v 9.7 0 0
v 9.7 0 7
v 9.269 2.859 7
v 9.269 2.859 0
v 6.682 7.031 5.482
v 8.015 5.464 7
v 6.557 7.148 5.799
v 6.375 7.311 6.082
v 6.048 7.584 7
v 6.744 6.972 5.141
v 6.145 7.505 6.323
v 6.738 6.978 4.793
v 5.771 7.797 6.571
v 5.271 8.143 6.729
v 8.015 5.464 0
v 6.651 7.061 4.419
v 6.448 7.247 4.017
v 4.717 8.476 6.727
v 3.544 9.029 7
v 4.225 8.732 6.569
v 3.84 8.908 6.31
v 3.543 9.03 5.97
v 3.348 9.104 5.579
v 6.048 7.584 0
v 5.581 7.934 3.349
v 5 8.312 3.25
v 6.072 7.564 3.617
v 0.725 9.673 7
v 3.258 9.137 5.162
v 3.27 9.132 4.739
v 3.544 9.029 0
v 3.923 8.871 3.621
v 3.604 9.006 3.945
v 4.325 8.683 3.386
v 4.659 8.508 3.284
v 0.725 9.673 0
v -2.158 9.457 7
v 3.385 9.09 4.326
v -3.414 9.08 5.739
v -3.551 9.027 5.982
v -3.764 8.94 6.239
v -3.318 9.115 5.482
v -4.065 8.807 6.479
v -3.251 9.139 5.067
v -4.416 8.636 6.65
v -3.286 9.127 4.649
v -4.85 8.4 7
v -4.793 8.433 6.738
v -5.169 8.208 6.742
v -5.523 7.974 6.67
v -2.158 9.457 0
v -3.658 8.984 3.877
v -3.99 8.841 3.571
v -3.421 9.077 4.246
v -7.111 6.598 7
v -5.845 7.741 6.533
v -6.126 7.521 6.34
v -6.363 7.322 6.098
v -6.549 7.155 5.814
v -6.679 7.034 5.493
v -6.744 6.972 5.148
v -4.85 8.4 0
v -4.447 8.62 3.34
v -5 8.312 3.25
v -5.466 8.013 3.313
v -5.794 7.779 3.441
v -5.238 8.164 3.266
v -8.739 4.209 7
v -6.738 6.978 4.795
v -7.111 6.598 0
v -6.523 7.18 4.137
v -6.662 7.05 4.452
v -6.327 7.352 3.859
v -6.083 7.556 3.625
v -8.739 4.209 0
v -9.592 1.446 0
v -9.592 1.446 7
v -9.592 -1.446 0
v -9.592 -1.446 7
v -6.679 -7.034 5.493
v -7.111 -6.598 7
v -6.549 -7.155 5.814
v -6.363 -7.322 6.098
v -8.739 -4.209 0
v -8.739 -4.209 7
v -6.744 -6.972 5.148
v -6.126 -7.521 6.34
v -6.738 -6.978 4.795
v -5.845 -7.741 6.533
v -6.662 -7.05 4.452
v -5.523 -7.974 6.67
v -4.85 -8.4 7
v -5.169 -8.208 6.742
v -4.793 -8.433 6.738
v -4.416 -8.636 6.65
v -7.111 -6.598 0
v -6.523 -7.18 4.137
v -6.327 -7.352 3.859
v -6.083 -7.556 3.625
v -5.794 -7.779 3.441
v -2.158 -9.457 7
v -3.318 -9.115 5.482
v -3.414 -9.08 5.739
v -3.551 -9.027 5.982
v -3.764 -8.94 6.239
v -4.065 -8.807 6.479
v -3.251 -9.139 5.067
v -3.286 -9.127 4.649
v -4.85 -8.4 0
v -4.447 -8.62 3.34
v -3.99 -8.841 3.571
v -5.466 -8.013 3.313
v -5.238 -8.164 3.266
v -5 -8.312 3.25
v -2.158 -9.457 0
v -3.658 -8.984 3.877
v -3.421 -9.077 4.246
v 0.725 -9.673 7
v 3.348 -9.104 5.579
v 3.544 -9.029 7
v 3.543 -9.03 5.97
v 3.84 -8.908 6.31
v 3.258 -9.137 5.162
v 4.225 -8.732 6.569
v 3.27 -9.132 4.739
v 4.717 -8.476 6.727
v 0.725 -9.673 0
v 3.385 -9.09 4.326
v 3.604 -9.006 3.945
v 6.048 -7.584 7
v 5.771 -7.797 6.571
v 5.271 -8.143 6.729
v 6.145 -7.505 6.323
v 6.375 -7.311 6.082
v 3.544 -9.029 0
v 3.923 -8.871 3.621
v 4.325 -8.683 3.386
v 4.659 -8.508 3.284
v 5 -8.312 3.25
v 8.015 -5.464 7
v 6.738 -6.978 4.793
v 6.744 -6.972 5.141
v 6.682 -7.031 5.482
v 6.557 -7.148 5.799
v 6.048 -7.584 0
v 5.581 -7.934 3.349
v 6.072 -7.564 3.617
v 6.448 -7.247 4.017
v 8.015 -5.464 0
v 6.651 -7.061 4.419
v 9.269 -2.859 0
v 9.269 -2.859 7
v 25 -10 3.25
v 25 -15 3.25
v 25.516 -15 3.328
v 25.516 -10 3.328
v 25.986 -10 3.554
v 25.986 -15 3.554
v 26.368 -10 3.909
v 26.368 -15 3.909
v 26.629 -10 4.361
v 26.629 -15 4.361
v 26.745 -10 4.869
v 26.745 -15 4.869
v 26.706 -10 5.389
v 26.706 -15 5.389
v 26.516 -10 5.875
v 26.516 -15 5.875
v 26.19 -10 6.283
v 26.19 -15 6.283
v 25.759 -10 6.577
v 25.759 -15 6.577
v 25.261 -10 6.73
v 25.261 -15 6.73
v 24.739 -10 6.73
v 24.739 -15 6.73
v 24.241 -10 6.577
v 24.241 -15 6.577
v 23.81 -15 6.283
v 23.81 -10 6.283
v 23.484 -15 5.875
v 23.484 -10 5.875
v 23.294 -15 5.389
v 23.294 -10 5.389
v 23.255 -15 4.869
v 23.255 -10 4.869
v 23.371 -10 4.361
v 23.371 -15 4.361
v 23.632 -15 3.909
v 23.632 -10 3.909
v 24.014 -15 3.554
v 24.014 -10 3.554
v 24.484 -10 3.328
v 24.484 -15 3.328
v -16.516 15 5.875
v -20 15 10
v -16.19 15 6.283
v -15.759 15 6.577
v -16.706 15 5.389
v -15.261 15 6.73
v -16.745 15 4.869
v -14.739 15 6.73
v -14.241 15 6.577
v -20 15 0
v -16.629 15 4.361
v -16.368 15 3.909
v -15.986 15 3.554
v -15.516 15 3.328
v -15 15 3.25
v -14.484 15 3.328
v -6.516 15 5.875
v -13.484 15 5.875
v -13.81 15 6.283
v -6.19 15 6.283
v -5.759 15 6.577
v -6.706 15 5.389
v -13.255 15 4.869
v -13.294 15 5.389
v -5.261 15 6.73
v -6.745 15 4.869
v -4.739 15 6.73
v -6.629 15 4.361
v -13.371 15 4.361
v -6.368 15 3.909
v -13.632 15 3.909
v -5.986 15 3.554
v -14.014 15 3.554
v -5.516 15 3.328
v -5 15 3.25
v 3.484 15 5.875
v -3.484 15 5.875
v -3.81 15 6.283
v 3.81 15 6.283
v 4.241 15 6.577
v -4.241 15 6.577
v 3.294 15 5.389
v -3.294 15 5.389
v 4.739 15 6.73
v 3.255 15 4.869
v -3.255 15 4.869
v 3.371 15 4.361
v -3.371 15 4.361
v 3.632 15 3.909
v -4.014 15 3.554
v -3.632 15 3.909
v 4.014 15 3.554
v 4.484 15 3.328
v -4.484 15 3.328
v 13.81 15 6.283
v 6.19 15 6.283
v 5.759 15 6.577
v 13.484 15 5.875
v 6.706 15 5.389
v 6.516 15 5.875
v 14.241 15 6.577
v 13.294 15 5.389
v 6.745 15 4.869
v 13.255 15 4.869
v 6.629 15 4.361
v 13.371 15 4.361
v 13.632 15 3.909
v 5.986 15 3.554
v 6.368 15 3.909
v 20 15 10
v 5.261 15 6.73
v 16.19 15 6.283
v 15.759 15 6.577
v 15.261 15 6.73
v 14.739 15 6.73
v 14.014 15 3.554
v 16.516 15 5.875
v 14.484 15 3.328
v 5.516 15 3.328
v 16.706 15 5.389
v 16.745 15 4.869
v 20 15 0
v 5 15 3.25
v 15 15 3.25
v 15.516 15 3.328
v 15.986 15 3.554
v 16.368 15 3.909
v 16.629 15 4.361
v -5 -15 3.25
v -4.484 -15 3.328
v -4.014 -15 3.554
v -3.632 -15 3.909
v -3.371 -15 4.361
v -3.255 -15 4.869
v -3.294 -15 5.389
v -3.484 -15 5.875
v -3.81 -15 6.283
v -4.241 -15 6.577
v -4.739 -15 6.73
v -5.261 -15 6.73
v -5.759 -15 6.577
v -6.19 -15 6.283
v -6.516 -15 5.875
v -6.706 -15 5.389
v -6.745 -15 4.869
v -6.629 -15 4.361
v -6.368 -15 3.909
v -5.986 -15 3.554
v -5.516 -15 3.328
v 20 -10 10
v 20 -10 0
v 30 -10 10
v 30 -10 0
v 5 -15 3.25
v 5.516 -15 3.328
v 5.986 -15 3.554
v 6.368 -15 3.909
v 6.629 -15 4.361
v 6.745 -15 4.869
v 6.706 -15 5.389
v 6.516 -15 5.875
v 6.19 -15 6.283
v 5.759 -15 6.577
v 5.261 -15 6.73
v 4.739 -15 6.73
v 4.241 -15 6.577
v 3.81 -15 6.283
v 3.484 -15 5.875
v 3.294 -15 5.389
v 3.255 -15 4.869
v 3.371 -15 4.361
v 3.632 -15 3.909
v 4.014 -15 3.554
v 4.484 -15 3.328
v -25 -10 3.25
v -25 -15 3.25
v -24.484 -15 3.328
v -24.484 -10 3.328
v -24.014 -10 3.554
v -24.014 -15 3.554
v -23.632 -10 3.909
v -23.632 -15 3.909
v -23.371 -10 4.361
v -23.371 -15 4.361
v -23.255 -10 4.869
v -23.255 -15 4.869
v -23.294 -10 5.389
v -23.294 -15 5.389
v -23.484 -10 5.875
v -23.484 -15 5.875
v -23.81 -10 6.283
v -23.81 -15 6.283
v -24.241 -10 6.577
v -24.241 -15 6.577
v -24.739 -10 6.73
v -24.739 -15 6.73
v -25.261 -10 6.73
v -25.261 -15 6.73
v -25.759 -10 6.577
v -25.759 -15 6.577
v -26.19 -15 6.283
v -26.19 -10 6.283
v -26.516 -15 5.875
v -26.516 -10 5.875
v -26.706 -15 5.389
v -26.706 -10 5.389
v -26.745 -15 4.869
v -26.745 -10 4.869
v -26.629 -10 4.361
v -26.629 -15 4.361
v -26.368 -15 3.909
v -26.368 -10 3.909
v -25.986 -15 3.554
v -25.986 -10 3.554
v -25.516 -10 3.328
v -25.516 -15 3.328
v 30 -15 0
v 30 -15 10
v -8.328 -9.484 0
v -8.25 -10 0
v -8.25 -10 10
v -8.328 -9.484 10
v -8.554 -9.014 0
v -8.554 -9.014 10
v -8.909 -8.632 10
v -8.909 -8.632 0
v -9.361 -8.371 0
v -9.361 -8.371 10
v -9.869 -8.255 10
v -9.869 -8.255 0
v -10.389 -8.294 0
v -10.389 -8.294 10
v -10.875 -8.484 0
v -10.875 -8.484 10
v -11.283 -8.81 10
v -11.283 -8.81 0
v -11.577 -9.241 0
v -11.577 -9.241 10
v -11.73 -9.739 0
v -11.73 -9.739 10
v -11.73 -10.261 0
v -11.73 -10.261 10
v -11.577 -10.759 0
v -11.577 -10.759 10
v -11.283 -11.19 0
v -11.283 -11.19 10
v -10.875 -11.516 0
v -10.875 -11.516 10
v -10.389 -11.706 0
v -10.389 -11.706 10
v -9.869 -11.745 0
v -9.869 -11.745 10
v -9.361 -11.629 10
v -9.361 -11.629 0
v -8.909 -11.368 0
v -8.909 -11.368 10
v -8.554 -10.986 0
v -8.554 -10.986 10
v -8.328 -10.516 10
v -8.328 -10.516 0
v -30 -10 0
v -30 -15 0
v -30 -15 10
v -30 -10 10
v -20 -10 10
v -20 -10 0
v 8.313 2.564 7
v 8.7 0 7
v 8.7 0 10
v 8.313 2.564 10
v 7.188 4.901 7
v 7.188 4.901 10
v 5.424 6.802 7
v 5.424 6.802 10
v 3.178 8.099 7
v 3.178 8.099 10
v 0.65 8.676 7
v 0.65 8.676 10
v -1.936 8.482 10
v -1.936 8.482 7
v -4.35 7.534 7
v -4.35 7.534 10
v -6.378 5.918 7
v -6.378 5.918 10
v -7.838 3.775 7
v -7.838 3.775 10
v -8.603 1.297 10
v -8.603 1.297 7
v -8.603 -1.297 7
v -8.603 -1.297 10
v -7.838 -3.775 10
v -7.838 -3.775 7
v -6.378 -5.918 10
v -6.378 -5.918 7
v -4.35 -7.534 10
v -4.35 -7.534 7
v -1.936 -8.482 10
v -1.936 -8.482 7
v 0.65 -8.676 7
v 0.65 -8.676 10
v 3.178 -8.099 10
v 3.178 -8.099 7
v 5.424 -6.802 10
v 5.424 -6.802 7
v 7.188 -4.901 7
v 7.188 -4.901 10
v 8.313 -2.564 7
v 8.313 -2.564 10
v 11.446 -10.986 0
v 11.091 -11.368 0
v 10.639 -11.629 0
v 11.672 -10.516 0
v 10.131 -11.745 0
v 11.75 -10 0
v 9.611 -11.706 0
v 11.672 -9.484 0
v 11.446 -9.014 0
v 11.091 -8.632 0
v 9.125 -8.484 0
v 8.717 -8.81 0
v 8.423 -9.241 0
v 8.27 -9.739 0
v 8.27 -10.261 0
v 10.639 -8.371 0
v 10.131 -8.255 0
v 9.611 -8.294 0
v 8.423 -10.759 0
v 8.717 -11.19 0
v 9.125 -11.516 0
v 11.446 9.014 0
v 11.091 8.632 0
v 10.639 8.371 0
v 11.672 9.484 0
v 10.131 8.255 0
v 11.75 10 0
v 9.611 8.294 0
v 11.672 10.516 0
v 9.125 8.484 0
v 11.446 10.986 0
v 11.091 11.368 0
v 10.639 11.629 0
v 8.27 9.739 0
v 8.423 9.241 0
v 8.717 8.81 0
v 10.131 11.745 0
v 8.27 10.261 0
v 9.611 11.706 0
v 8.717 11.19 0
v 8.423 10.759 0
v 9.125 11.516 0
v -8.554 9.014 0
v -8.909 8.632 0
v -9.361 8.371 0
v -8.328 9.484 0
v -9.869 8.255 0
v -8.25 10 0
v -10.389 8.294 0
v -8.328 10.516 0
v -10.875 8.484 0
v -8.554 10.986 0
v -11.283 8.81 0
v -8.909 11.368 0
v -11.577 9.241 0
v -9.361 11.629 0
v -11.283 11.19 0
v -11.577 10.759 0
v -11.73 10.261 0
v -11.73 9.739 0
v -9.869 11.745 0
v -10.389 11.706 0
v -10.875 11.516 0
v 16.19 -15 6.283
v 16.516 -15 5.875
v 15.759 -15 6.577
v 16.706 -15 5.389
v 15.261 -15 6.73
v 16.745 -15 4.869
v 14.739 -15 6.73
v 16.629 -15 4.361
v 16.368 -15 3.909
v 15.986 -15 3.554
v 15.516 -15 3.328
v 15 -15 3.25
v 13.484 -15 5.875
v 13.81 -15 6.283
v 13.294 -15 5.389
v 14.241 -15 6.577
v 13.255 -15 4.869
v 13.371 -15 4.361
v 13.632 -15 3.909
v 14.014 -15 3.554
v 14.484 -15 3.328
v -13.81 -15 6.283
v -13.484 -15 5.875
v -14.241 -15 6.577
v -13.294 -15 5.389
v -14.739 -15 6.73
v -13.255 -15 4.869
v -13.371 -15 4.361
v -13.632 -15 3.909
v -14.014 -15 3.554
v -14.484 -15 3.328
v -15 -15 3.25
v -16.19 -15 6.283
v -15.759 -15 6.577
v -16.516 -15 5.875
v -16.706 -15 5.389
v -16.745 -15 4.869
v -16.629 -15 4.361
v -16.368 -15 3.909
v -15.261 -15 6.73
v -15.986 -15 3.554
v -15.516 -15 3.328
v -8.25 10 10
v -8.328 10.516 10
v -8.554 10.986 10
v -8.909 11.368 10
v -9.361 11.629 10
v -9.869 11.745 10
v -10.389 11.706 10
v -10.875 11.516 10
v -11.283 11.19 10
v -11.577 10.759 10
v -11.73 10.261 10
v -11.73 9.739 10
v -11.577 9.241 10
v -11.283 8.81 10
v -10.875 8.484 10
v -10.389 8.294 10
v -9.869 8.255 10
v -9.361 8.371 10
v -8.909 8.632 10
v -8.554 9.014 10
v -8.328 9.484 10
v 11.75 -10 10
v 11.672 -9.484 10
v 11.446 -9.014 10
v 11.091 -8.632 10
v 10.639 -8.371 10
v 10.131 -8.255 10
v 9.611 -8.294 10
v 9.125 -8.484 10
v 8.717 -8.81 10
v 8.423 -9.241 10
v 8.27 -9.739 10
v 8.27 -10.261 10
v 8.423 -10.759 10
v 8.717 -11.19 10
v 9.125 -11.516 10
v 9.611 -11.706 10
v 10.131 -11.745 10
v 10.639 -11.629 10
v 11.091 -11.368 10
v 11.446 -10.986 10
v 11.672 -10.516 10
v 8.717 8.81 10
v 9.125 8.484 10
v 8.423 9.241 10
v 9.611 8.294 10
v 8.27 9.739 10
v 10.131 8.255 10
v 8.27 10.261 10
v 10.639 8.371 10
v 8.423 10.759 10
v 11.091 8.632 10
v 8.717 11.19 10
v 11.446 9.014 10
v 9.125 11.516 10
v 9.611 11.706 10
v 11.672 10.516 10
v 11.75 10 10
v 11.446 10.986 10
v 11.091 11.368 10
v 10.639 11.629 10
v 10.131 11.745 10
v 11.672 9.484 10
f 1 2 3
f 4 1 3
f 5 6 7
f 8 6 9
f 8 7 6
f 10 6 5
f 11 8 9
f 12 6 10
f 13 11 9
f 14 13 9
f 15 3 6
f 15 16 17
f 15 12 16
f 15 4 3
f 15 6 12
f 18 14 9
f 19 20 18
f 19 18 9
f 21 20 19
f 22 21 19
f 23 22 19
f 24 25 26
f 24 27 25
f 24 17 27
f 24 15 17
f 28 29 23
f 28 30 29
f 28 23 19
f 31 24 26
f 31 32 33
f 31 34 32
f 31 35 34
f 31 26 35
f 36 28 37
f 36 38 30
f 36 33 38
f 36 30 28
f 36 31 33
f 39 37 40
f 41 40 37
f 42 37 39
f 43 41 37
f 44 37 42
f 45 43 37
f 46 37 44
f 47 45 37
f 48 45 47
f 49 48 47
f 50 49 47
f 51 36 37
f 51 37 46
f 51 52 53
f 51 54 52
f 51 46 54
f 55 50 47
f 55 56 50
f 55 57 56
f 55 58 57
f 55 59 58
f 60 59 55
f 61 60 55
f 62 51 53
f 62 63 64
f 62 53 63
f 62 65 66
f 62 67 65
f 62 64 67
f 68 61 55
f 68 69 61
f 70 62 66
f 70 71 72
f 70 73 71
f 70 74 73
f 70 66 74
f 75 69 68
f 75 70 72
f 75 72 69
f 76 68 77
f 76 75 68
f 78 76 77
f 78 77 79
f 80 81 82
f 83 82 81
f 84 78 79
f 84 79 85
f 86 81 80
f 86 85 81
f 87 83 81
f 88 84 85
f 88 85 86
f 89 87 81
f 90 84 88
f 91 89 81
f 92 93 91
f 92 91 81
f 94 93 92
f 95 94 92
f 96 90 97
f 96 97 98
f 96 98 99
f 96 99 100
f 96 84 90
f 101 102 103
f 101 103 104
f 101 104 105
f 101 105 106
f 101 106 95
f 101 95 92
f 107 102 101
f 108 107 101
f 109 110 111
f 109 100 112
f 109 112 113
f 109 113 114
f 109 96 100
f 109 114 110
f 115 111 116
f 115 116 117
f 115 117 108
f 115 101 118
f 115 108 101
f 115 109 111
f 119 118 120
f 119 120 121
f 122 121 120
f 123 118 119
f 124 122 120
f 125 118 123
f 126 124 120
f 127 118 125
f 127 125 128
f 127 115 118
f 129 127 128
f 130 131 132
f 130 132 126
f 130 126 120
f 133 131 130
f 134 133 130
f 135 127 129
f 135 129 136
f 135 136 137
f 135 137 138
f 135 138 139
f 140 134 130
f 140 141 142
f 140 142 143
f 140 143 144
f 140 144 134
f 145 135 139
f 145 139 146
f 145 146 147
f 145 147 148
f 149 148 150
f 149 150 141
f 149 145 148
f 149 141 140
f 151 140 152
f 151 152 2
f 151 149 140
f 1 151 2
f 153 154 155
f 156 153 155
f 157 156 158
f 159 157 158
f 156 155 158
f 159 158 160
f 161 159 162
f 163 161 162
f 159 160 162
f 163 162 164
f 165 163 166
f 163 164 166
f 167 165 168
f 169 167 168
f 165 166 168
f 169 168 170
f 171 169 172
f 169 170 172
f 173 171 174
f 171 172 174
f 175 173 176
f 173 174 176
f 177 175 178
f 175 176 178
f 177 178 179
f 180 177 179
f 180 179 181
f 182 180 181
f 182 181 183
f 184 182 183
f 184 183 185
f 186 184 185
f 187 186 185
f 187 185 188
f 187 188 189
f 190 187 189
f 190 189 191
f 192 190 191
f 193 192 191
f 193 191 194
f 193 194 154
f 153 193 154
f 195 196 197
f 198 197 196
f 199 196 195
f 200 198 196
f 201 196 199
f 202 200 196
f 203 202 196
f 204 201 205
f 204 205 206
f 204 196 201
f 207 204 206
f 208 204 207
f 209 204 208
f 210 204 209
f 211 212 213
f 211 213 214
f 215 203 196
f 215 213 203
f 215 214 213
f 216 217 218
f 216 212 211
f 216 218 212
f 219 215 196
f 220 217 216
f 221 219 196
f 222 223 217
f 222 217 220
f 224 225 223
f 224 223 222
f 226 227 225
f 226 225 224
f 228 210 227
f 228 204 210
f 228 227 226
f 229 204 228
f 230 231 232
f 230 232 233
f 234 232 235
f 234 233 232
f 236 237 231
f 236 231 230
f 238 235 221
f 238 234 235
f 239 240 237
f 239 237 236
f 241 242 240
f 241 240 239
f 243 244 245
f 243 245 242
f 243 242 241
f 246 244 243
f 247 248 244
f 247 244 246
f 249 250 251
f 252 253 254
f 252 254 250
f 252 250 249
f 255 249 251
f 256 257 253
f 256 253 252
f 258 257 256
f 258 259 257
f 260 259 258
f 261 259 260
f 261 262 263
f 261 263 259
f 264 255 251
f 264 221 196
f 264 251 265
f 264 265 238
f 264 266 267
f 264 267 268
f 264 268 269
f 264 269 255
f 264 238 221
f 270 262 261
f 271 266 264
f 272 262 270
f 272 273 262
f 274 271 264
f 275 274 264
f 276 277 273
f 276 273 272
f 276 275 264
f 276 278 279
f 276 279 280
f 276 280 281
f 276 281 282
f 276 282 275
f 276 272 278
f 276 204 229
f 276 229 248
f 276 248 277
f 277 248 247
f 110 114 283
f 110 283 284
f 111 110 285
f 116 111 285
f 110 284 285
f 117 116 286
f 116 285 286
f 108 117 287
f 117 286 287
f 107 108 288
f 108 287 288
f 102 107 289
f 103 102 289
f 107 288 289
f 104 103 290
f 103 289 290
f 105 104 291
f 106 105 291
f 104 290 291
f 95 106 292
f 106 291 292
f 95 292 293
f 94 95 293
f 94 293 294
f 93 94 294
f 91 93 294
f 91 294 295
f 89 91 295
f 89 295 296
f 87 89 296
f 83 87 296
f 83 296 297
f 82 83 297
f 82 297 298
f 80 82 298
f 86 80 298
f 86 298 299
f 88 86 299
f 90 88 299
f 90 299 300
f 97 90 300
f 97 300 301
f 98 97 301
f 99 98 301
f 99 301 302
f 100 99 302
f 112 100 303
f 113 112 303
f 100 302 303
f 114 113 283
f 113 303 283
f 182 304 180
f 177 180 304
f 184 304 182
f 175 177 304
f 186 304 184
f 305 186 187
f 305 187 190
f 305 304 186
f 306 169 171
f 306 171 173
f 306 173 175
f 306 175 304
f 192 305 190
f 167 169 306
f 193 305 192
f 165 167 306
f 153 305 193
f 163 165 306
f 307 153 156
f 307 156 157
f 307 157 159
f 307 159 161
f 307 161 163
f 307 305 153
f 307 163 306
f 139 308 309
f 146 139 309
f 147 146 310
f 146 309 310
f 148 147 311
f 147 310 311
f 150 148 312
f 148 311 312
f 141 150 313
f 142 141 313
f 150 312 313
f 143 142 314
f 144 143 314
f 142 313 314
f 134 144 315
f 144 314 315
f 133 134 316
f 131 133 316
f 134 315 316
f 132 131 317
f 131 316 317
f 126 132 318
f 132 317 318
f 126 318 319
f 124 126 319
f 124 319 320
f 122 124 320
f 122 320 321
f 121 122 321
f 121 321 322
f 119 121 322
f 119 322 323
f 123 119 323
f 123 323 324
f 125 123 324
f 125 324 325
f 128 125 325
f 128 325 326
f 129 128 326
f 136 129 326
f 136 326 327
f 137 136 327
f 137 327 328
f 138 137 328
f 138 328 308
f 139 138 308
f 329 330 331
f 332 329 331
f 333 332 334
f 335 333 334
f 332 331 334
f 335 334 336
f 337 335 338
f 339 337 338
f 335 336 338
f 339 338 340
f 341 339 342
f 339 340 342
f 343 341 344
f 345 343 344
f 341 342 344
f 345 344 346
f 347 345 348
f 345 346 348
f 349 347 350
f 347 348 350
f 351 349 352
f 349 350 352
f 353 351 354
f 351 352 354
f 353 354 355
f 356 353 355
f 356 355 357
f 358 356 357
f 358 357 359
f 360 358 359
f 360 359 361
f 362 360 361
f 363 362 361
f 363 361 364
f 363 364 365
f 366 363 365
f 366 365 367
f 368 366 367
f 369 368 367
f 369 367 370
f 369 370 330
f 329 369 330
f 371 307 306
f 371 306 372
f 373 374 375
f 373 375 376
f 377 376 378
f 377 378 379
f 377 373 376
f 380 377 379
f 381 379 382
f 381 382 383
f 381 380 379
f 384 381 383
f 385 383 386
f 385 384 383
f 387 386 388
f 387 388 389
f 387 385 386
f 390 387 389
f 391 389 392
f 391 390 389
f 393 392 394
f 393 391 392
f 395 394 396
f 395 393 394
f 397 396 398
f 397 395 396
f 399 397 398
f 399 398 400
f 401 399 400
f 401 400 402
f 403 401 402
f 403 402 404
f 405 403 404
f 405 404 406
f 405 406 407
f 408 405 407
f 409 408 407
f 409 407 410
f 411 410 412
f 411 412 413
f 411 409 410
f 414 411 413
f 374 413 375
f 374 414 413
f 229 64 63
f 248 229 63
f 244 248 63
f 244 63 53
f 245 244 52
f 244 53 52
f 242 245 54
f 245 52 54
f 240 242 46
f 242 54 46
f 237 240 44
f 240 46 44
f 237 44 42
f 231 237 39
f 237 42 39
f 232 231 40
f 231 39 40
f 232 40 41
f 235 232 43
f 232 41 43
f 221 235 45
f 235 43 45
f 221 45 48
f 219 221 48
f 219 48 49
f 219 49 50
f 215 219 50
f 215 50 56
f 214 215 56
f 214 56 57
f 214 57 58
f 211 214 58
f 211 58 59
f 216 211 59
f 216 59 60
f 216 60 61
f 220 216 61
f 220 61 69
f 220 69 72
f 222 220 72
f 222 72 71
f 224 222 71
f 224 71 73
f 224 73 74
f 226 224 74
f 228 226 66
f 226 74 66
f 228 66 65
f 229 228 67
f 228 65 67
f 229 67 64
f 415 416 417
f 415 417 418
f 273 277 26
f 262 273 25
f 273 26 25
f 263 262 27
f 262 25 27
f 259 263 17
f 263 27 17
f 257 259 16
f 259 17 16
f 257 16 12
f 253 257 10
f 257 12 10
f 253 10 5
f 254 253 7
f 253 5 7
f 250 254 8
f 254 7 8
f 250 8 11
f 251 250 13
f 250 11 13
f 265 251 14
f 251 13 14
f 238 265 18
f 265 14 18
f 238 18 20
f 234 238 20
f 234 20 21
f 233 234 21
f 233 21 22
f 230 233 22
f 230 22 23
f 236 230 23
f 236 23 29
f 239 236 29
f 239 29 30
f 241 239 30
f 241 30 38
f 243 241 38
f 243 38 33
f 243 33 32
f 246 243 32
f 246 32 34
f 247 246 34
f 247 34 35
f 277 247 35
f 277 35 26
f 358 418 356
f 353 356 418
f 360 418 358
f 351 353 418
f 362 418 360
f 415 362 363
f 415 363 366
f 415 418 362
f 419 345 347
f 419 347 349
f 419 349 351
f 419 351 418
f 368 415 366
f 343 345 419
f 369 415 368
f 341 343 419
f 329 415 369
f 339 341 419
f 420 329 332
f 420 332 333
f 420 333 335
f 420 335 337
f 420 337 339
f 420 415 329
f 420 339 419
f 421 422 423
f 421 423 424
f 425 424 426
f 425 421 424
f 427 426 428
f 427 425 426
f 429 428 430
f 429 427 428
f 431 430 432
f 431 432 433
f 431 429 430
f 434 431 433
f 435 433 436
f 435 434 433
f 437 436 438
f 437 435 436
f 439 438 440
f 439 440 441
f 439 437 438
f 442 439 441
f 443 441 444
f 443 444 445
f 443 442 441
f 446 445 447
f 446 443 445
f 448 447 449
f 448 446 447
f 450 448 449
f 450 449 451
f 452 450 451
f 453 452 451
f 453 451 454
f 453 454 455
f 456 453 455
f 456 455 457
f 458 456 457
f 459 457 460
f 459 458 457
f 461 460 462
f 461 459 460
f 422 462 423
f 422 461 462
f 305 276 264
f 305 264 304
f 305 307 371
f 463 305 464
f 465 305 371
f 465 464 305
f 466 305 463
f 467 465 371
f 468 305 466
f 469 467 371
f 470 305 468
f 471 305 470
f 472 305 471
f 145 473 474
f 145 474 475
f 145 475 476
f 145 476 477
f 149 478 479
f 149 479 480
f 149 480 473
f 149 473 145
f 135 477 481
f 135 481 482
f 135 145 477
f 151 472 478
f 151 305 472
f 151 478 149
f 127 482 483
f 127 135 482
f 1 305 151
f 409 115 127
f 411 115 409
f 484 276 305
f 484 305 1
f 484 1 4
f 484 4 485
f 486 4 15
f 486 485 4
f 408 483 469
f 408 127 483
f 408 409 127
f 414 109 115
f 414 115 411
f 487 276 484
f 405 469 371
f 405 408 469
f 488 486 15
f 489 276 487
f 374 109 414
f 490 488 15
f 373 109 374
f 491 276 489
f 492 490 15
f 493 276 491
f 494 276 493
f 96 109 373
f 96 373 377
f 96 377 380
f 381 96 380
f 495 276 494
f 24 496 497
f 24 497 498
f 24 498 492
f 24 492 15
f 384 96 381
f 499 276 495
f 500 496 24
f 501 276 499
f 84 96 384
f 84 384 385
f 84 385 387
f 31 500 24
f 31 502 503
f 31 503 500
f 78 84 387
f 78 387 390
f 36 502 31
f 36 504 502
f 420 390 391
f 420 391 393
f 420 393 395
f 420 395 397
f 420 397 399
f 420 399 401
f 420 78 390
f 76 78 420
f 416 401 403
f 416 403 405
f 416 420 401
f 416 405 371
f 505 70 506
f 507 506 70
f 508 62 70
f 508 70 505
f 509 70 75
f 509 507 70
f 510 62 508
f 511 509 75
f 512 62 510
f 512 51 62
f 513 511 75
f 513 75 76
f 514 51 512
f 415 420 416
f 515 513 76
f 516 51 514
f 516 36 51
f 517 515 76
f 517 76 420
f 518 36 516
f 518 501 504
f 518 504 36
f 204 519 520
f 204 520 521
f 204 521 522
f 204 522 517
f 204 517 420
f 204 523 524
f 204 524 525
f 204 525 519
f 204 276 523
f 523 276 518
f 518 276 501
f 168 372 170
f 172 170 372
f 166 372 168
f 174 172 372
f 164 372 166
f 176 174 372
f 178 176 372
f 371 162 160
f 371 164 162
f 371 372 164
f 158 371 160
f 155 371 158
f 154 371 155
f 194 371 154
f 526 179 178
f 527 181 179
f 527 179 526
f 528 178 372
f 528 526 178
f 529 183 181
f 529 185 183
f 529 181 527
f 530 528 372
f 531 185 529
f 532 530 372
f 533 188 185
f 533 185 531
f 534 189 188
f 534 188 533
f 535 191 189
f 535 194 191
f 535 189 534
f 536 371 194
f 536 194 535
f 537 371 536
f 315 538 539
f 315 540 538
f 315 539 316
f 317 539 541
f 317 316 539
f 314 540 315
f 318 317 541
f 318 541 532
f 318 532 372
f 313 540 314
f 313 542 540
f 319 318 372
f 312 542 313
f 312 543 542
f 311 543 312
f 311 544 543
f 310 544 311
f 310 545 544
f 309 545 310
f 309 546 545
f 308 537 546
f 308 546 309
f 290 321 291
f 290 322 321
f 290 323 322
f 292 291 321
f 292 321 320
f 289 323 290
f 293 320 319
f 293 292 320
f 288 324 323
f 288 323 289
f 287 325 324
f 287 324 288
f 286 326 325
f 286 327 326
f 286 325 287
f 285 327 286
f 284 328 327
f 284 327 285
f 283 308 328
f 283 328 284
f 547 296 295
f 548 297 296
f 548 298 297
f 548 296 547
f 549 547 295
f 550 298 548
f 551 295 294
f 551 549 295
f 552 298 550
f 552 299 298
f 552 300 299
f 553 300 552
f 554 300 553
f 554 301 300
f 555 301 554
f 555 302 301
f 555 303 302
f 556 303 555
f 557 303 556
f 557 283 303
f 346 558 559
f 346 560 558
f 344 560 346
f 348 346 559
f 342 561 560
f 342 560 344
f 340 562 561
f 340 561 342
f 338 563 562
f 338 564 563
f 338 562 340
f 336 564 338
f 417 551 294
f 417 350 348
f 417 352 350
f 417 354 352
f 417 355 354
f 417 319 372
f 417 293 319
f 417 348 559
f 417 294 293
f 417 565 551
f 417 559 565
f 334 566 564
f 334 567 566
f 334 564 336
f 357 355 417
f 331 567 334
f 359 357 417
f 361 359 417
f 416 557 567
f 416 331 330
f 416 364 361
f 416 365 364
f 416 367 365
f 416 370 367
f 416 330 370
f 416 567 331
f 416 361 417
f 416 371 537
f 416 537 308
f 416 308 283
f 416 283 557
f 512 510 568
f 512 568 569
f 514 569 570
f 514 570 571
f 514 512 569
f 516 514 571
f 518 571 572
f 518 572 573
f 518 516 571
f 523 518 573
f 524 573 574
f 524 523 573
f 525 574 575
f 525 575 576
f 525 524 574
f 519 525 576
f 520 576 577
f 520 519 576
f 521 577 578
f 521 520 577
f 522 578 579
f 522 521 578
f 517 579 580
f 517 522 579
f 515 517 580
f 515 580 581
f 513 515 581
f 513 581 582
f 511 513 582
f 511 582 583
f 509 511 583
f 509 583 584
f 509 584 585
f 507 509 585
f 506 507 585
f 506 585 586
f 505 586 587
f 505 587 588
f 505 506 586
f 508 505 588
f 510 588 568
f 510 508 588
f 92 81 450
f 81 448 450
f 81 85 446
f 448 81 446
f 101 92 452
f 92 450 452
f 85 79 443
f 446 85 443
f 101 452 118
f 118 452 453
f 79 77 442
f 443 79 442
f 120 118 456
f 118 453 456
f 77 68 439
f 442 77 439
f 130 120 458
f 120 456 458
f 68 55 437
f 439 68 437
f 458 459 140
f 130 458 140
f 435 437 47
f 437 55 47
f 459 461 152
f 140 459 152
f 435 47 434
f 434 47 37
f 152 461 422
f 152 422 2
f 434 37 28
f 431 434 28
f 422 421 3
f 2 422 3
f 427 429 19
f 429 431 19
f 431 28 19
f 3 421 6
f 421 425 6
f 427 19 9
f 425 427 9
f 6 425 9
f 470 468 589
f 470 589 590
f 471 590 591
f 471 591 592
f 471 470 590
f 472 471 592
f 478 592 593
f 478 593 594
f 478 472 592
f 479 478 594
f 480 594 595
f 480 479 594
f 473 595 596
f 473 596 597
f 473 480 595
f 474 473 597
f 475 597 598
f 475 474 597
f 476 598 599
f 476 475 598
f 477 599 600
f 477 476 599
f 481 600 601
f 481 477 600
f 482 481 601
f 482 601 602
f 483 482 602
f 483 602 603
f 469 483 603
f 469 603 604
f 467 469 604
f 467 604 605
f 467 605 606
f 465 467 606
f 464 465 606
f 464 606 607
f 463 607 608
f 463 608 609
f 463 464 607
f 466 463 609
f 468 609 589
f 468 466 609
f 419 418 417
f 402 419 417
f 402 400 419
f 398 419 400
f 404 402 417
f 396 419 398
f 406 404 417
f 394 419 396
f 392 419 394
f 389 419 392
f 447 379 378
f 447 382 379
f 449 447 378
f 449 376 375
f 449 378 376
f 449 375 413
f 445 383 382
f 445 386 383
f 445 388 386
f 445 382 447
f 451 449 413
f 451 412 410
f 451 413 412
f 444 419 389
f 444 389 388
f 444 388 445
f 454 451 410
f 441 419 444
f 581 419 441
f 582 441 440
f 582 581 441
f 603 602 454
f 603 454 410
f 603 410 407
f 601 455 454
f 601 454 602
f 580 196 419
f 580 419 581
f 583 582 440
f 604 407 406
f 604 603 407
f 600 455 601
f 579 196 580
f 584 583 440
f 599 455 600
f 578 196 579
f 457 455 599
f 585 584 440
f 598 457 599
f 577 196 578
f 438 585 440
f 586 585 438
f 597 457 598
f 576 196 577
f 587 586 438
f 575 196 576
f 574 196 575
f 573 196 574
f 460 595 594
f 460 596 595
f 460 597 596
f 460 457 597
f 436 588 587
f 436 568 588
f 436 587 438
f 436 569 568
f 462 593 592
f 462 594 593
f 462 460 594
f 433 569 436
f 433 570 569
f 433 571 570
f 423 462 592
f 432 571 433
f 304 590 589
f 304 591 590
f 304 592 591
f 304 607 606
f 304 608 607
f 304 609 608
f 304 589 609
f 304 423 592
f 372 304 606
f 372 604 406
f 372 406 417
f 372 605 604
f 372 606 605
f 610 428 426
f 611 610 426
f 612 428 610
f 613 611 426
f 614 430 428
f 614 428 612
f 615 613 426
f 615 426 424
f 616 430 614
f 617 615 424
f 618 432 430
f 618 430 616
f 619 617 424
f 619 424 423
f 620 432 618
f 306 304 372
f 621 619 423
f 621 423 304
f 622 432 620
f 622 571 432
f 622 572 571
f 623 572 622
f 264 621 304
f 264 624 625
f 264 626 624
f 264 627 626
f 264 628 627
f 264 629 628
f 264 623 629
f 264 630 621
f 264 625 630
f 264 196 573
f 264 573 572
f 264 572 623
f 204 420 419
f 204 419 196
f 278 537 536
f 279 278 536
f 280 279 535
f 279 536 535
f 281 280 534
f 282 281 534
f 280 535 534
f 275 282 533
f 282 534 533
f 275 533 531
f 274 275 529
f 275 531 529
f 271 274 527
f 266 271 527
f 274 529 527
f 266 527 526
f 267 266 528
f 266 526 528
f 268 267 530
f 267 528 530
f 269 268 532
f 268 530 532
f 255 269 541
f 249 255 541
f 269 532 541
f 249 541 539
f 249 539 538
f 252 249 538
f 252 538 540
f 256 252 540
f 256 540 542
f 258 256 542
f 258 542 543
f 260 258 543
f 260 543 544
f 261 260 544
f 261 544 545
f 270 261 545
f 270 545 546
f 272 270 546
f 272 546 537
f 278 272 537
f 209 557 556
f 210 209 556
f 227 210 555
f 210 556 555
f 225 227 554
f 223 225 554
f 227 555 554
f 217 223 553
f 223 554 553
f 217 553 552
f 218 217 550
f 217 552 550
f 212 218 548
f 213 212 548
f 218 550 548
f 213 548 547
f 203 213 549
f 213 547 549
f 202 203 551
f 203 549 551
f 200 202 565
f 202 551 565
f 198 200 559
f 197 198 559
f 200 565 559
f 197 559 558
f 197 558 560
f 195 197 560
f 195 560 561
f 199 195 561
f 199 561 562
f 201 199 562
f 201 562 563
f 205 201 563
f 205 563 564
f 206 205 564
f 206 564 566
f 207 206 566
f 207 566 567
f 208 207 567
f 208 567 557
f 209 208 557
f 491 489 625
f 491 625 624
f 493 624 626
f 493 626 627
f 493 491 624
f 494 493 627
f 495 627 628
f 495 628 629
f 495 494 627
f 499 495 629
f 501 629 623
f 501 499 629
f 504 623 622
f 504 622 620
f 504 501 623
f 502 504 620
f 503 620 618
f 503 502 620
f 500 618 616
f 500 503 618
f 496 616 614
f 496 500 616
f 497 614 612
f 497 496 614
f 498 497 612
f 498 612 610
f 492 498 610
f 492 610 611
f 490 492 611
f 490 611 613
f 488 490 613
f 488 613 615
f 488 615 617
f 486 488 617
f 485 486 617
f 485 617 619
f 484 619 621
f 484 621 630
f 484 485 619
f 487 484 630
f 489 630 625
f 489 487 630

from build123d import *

# Parameters (mm, degrees)
ESQUISSE1_R             = 9.7
ESQUISSE1_R_2           = 1.75
BOSS_EXTRU_1_DEPTH      = 10
BOSS_EXTRU_2_START      = -3
ESQUISSE2_R             = 9.7
ESQUISSE2_R_2           = 8.7
BOSS_EXTRU_2_DEPTH      = 3
ESQUISSE3_R             = 1.75
ENL_V_MAT_EXTRU_1_DEPTH = 44.588989435


with BuildPart() as part:
    # Esquisse1 → Boss.-Extru.1 (new body)
    with BuildSketch(Plane.XY):
        Polygon((-20, -10), (-20, 15), (20, 15), (20, -10), (30, -10), (30, -15), (-30, -15), (-30, -10), align=None)
        Circle(ESQUISSE1_R, mode=Mode.SUBTRACT)
        with Locations((10, 10)):
            Circle(ESQUISSE1_R_2, mode=Mode.SUBTRACT)
        with Locations((-10, 10)):
            Circle(ESQUISSE1_R_2, mode=Mode.SUBTRACT)
        with Locations((-10, -10)):
            Circle(ESQUISSE1_R_2, mode=Mode.SUBTRACT)
        with Locations((10, -10)):
            Circle(ESQUISSE1_R_2, mode=Mode.SUBTRACT)
    extrude(amount=BOSS_EXTRU_1_DEPTH)

    # Esquisse2 → Boss.-Extru.2 (add)
    with BuildSketch(Plane.XY.offset(10).offset(BOSS_EXTRU_2_START)):
        Circle(ESQUISSE2_R)
        Circle(ESQUISSE2_R_2, mode=Mode.SUBTRACT)
    extrude(amount=BOSS_EXTRU_2_DEPTH)

    # Esquisse3 → Enlèv. mat.-Extru.1 (cut, through all)
    with BuildSketch(Plane.XZ.offset(15)):
        with Locations(Location((-25, 5, 0), (0, 0, 270))):
            Circle(ESQUISSE3_R)
        with Locations(Location((-15, 5, 0), (0, 0, 270))):
            Circle(ESQUISSE3_R)
        with Locations(Location((-5, 5, 0), (0, 0, 270))):
            Circle(ESQUISSE3_R)
        with Locations(Location((5, 5, 0), (0, 0, 270))):
            Circle(ESQUISSE3_R)
        with Locations(Location((15, 5, 0), (0, 0, 270))):
            Circle(ESQUISSE3_R)
        with Locations(Location((25, 5, 0), (0, 0, 270))):
            Circle(ESQUISSE3_R)
    extrude(amount=-ENL_V_MAT_EXTRU_1_DEPTH, mode=Mode.SUBTRACT)


solid = part.part
